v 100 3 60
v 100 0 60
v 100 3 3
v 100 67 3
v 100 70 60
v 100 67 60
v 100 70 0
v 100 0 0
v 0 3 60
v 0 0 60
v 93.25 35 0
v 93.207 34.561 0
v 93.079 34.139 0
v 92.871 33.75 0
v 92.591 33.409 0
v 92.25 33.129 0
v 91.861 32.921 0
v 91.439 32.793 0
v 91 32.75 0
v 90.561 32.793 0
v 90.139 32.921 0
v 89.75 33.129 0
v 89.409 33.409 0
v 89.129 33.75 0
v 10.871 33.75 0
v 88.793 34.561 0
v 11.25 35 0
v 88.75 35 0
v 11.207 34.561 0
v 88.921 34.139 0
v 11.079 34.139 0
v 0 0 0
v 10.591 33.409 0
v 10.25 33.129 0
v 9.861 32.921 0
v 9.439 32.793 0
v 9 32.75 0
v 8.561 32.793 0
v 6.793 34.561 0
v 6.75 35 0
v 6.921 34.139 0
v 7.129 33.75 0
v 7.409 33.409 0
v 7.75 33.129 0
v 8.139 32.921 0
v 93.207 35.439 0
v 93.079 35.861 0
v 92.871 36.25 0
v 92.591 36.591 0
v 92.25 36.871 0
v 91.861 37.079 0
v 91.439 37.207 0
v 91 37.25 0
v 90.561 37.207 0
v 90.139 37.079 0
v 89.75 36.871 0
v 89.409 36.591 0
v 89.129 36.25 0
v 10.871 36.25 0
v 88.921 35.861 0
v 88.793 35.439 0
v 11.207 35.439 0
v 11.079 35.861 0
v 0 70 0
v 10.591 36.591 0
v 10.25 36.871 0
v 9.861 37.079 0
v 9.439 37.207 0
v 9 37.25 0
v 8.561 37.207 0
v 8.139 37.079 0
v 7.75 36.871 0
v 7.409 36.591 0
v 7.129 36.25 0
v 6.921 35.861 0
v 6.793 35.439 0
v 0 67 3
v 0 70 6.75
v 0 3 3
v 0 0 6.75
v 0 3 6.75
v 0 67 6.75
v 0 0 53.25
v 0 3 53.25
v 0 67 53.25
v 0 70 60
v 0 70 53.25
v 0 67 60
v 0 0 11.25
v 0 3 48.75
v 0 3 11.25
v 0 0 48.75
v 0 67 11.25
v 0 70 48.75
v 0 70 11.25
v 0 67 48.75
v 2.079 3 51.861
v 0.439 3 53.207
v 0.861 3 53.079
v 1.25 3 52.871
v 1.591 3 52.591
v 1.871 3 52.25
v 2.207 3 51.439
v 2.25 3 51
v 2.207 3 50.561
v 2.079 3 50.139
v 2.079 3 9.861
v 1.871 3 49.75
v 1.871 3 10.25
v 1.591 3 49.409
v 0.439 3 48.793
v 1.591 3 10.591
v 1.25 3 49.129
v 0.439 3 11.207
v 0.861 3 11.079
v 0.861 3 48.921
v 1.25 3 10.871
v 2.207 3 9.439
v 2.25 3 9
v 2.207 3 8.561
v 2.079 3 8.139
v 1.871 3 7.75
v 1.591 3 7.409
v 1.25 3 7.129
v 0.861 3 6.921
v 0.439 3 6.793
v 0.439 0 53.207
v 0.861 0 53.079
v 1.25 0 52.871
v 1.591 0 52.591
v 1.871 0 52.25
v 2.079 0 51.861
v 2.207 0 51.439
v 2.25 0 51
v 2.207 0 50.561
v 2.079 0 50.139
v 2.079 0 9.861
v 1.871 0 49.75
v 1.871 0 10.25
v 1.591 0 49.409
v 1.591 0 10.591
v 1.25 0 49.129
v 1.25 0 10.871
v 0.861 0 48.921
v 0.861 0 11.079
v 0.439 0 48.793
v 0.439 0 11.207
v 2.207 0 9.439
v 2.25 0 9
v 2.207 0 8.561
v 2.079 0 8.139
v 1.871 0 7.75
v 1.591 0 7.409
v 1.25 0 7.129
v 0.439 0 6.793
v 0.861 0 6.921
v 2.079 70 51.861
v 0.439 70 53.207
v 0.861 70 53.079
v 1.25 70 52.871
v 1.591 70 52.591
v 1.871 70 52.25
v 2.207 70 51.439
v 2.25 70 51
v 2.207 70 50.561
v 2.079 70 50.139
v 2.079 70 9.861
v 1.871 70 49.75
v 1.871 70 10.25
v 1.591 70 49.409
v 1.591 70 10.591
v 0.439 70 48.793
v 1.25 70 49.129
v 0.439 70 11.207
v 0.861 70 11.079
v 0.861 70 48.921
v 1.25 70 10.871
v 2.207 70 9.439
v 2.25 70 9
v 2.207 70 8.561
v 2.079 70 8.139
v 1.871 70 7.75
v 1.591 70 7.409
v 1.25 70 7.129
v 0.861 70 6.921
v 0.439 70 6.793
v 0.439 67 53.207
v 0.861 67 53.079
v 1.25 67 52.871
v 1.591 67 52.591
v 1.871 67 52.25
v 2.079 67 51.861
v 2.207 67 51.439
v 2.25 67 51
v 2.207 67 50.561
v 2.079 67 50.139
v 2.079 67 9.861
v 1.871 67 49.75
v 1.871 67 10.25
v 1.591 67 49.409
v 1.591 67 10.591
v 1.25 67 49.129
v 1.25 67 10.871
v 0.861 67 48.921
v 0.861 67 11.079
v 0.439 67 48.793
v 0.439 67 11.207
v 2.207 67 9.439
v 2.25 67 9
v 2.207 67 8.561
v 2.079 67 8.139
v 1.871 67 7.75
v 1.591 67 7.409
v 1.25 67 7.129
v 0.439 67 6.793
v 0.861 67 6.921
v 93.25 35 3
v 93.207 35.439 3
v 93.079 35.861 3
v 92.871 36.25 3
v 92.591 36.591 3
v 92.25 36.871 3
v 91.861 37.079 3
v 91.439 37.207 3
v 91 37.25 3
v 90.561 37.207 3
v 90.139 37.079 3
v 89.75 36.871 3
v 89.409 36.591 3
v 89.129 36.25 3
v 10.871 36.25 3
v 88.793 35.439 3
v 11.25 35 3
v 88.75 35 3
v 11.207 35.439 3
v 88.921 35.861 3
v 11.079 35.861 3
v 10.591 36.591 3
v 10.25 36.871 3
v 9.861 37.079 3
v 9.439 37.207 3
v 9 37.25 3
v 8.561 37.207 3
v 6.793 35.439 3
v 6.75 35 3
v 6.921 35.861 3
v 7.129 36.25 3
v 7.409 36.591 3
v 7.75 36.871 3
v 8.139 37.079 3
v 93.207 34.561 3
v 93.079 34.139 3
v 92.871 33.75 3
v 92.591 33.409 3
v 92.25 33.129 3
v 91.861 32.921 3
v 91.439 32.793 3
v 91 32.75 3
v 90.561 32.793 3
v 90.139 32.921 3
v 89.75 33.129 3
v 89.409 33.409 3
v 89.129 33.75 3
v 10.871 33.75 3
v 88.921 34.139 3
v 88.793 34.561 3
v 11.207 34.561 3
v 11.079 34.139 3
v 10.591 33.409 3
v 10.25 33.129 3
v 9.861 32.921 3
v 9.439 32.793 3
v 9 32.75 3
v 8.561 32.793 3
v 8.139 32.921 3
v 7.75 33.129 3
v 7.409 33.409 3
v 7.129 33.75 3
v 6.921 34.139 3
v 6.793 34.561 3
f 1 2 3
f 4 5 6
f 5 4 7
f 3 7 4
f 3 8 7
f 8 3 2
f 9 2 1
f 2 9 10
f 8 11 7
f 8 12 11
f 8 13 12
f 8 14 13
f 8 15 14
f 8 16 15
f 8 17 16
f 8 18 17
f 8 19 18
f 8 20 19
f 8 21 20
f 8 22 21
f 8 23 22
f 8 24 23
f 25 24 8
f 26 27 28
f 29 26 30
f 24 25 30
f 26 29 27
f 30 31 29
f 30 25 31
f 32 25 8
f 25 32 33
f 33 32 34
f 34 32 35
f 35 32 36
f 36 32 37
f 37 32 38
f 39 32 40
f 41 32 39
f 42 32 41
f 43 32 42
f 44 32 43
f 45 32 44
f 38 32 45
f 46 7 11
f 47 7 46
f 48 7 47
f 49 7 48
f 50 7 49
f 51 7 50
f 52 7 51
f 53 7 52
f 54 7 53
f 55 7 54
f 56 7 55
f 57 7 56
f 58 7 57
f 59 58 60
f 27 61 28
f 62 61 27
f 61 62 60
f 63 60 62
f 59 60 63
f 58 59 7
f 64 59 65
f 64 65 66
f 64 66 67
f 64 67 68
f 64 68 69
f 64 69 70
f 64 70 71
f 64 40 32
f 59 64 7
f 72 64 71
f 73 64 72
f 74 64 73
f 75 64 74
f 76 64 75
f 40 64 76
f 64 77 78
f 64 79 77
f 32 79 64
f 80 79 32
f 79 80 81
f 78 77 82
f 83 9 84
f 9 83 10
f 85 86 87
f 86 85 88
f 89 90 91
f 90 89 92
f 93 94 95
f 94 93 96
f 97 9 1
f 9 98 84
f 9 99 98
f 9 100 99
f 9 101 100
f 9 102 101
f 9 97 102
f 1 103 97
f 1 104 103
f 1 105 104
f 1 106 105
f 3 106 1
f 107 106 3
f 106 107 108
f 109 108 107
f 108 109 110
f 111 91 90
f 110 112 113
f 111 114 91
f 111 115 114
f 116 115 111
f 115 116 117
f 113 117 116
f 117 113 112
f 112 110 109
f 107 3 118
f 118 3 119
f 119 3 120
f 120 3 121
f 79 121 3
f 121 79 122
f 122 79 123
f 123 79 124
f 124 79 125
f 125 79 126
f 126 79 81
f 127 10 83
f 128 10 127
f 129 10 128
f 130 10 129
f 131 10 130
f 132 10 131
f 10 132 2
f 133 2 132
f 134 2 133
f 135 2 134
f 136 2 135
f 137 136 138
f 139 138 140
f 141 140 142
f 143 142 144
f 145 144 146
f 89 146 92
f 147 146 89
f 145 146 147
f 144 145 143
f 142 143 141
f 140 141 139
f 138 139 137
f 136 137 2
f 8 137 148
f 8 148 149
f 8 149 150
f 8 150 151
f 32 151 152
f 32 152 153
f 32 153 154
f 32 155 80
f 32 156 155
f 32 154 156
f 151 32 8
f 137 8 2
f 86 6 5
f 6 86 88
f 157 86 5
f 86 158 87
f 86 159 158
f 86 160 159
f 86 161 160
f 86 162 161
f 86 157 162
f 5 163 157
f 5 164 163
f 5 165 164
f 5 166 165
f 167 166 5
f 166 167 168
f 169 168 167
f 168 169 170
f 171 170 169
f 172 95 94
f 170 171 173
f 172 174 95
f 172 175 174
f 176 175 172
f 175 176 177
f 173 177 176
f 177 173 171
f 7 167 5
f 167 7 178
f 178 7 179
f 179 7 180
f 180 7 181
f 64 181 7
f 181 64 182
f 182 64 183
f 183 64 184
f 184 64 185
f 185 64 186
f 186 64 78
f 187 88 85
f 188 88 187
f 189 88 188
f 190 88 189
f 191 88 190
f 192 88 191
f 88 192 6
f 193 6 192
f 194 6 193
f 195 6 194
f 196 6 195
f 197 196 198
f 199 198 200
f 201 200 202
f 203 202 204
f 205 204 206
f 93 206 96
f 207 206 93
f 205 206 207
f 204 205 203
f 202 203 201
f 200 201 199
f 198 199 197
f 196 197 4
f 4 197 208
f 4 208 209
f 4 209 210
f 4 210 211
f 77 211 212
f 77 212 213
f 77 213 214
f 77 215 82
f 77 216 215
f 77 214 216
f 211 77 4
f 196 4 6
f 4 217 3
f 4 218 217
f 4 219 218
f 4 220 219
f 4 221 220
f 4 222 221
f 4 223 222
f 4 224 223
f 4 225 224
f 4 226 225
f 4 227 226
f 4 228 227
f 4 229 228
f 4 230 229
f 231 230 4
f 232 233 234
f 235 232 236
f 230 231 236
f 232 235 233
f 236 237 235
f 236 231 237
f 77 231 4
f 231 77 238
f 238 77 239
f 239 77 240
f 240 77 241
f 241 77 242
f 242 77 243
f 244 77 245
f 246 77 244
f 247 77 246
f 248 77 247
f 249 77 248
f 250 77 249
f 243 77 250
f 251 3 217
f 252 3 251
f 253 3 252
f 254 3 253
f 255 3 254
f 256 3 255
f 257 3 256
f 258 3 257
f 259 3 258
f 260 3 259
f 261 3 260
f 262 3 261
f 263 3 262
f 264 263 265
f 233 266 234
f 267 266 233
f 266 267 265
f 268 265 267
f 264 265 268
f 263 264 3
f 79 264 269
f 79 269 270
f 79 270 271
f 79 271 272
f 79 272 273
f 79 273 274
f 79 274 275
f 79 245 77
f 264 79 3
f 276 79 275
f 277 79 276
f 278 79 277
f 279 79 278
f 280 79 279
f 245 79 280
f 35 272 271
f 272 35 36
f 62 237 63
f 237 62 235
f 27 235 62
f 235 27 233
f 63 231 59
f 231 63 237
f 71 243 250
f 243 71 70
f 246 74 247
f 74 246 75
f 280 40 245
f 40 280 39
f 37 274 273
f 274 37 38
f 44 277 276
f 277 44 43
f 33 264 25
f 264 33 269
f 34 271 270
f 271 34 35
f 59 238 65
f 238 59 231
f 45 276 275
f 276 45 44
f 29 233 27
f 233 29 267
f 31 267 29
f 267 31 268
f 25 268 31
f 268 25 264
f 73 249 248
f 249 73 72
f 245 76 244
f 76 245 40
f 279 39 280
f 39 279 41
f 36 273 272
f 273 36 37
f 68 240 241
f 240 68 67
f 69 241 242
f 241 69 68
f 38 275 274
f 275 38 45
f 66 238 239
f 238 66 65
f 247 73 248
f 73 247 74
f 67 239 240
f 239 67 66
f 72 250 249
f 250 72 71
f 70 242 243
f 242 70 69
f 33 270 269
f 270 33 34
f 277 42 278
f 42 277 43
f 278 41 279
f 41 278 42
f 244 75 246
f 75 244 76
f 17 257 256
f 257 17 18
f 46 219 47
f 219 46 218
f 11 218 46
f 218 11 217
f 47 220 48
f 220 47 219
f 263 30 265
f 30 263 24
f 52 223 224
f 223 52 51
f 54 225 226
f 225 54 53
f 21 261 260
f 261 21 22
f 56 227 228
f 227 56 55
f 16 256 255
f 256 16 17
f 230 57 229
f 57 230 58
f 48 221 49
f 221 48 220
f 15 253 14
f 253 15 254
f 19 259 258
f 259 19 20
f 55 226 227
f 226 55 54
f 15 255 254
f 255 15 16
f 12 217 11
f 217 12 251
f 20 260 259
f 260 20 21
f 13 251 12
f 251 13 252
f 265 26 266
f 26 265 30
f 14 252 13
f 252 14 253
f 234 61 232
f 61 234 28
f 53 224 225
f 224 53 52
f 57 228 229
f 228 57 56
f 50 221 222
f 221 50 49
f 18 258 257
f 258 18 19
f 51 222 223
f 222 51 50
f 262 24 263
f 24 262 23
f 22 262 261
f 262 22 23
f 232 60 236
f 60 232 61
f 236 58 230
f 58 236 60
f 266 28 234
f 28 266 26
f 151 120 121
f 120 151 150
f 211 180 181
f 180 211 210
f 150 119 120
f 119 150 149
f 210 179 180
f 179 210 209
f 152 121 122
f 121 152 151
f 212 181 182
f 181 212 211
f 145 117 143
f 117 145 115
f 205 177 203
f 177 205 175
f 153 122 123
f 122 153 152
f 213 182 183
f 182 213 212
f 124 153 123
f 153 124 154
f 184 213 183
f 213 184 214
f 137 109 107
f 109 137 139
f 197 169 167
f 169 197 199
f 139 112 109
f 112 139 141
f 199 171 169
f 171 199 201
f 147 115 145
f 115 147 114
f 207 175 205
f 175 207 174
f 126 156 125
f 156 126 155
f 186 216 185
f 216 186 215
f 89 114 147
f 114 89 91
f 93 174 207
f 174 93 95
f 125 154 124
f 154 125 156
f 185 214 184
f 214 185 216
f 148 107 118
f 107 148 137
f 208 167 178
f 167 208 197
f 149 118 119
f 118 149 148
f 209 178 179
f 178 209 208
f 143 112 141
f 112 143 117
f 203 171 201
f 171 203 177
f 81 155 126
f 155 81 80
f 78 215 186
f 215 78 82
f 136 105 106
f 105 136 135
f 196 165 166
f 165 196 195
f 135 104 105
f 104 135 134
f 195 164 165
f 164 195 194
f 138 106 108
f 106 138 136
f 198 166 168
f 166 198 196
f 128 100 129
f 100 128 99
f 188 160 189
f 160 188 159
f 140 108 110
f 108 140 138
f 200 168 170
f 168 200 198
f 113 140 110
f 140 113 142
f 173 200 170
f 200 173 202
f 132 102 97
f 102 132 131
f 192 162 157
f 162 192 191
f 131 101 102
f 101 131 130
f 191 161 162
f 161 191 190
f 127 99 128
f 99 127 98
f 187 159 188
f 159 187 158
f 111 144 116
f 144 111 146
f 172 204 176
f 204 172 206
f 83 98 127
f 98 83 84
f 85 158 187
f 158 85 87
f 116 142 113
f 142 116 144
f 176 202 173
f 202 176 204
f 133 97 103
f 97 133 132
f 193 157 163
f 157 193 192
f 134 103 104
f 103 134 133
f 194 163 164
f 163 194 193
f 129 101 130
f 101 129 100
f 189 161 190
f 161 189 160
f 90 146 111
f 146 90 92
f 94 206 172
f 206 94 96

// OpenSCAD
$fn = 32;

// ----------------------------------------------------------------------
// U-bracket: 100 x 70 x 60 mm
// ----------------------------------------------------------------------

// --- parameters (mm) ---
base_len = 100;           // outer length, X
channel_w = 70;           // outer width, Y
upright_h = 60;           // upright height, Z
mat_t = 3;                // wall thickness
hole_d = 4.5;             // clearance for M4

module hole_z(px, py) {
  translate([px, py, -2.5]) cylinder(h = mat_t + 5, d = hole_d);
}
module hole_y_pz(pz) {
  /* through both uprights along Y */
  translate([0, -2.5, pz]) rotate([-90, 0, 0]) cylinder(h = channel_w + 5, d = hole_d);
}

module base() {
  cube([base_len, channel_w, mat_t]);
}

module uprights() {
  cube([base_len, mat_t, upright_h]);
  translate([0, channel_w - mat_t, 0]) cube([base_len, mat_t, upright_h]);
}

difference() {
  union() {
    base();
    uprights();
  }
  hole_z(9, 35);
  hole_z(91, 35);
  hole_y_pz(9);
  hole_y_pz(51);
}
